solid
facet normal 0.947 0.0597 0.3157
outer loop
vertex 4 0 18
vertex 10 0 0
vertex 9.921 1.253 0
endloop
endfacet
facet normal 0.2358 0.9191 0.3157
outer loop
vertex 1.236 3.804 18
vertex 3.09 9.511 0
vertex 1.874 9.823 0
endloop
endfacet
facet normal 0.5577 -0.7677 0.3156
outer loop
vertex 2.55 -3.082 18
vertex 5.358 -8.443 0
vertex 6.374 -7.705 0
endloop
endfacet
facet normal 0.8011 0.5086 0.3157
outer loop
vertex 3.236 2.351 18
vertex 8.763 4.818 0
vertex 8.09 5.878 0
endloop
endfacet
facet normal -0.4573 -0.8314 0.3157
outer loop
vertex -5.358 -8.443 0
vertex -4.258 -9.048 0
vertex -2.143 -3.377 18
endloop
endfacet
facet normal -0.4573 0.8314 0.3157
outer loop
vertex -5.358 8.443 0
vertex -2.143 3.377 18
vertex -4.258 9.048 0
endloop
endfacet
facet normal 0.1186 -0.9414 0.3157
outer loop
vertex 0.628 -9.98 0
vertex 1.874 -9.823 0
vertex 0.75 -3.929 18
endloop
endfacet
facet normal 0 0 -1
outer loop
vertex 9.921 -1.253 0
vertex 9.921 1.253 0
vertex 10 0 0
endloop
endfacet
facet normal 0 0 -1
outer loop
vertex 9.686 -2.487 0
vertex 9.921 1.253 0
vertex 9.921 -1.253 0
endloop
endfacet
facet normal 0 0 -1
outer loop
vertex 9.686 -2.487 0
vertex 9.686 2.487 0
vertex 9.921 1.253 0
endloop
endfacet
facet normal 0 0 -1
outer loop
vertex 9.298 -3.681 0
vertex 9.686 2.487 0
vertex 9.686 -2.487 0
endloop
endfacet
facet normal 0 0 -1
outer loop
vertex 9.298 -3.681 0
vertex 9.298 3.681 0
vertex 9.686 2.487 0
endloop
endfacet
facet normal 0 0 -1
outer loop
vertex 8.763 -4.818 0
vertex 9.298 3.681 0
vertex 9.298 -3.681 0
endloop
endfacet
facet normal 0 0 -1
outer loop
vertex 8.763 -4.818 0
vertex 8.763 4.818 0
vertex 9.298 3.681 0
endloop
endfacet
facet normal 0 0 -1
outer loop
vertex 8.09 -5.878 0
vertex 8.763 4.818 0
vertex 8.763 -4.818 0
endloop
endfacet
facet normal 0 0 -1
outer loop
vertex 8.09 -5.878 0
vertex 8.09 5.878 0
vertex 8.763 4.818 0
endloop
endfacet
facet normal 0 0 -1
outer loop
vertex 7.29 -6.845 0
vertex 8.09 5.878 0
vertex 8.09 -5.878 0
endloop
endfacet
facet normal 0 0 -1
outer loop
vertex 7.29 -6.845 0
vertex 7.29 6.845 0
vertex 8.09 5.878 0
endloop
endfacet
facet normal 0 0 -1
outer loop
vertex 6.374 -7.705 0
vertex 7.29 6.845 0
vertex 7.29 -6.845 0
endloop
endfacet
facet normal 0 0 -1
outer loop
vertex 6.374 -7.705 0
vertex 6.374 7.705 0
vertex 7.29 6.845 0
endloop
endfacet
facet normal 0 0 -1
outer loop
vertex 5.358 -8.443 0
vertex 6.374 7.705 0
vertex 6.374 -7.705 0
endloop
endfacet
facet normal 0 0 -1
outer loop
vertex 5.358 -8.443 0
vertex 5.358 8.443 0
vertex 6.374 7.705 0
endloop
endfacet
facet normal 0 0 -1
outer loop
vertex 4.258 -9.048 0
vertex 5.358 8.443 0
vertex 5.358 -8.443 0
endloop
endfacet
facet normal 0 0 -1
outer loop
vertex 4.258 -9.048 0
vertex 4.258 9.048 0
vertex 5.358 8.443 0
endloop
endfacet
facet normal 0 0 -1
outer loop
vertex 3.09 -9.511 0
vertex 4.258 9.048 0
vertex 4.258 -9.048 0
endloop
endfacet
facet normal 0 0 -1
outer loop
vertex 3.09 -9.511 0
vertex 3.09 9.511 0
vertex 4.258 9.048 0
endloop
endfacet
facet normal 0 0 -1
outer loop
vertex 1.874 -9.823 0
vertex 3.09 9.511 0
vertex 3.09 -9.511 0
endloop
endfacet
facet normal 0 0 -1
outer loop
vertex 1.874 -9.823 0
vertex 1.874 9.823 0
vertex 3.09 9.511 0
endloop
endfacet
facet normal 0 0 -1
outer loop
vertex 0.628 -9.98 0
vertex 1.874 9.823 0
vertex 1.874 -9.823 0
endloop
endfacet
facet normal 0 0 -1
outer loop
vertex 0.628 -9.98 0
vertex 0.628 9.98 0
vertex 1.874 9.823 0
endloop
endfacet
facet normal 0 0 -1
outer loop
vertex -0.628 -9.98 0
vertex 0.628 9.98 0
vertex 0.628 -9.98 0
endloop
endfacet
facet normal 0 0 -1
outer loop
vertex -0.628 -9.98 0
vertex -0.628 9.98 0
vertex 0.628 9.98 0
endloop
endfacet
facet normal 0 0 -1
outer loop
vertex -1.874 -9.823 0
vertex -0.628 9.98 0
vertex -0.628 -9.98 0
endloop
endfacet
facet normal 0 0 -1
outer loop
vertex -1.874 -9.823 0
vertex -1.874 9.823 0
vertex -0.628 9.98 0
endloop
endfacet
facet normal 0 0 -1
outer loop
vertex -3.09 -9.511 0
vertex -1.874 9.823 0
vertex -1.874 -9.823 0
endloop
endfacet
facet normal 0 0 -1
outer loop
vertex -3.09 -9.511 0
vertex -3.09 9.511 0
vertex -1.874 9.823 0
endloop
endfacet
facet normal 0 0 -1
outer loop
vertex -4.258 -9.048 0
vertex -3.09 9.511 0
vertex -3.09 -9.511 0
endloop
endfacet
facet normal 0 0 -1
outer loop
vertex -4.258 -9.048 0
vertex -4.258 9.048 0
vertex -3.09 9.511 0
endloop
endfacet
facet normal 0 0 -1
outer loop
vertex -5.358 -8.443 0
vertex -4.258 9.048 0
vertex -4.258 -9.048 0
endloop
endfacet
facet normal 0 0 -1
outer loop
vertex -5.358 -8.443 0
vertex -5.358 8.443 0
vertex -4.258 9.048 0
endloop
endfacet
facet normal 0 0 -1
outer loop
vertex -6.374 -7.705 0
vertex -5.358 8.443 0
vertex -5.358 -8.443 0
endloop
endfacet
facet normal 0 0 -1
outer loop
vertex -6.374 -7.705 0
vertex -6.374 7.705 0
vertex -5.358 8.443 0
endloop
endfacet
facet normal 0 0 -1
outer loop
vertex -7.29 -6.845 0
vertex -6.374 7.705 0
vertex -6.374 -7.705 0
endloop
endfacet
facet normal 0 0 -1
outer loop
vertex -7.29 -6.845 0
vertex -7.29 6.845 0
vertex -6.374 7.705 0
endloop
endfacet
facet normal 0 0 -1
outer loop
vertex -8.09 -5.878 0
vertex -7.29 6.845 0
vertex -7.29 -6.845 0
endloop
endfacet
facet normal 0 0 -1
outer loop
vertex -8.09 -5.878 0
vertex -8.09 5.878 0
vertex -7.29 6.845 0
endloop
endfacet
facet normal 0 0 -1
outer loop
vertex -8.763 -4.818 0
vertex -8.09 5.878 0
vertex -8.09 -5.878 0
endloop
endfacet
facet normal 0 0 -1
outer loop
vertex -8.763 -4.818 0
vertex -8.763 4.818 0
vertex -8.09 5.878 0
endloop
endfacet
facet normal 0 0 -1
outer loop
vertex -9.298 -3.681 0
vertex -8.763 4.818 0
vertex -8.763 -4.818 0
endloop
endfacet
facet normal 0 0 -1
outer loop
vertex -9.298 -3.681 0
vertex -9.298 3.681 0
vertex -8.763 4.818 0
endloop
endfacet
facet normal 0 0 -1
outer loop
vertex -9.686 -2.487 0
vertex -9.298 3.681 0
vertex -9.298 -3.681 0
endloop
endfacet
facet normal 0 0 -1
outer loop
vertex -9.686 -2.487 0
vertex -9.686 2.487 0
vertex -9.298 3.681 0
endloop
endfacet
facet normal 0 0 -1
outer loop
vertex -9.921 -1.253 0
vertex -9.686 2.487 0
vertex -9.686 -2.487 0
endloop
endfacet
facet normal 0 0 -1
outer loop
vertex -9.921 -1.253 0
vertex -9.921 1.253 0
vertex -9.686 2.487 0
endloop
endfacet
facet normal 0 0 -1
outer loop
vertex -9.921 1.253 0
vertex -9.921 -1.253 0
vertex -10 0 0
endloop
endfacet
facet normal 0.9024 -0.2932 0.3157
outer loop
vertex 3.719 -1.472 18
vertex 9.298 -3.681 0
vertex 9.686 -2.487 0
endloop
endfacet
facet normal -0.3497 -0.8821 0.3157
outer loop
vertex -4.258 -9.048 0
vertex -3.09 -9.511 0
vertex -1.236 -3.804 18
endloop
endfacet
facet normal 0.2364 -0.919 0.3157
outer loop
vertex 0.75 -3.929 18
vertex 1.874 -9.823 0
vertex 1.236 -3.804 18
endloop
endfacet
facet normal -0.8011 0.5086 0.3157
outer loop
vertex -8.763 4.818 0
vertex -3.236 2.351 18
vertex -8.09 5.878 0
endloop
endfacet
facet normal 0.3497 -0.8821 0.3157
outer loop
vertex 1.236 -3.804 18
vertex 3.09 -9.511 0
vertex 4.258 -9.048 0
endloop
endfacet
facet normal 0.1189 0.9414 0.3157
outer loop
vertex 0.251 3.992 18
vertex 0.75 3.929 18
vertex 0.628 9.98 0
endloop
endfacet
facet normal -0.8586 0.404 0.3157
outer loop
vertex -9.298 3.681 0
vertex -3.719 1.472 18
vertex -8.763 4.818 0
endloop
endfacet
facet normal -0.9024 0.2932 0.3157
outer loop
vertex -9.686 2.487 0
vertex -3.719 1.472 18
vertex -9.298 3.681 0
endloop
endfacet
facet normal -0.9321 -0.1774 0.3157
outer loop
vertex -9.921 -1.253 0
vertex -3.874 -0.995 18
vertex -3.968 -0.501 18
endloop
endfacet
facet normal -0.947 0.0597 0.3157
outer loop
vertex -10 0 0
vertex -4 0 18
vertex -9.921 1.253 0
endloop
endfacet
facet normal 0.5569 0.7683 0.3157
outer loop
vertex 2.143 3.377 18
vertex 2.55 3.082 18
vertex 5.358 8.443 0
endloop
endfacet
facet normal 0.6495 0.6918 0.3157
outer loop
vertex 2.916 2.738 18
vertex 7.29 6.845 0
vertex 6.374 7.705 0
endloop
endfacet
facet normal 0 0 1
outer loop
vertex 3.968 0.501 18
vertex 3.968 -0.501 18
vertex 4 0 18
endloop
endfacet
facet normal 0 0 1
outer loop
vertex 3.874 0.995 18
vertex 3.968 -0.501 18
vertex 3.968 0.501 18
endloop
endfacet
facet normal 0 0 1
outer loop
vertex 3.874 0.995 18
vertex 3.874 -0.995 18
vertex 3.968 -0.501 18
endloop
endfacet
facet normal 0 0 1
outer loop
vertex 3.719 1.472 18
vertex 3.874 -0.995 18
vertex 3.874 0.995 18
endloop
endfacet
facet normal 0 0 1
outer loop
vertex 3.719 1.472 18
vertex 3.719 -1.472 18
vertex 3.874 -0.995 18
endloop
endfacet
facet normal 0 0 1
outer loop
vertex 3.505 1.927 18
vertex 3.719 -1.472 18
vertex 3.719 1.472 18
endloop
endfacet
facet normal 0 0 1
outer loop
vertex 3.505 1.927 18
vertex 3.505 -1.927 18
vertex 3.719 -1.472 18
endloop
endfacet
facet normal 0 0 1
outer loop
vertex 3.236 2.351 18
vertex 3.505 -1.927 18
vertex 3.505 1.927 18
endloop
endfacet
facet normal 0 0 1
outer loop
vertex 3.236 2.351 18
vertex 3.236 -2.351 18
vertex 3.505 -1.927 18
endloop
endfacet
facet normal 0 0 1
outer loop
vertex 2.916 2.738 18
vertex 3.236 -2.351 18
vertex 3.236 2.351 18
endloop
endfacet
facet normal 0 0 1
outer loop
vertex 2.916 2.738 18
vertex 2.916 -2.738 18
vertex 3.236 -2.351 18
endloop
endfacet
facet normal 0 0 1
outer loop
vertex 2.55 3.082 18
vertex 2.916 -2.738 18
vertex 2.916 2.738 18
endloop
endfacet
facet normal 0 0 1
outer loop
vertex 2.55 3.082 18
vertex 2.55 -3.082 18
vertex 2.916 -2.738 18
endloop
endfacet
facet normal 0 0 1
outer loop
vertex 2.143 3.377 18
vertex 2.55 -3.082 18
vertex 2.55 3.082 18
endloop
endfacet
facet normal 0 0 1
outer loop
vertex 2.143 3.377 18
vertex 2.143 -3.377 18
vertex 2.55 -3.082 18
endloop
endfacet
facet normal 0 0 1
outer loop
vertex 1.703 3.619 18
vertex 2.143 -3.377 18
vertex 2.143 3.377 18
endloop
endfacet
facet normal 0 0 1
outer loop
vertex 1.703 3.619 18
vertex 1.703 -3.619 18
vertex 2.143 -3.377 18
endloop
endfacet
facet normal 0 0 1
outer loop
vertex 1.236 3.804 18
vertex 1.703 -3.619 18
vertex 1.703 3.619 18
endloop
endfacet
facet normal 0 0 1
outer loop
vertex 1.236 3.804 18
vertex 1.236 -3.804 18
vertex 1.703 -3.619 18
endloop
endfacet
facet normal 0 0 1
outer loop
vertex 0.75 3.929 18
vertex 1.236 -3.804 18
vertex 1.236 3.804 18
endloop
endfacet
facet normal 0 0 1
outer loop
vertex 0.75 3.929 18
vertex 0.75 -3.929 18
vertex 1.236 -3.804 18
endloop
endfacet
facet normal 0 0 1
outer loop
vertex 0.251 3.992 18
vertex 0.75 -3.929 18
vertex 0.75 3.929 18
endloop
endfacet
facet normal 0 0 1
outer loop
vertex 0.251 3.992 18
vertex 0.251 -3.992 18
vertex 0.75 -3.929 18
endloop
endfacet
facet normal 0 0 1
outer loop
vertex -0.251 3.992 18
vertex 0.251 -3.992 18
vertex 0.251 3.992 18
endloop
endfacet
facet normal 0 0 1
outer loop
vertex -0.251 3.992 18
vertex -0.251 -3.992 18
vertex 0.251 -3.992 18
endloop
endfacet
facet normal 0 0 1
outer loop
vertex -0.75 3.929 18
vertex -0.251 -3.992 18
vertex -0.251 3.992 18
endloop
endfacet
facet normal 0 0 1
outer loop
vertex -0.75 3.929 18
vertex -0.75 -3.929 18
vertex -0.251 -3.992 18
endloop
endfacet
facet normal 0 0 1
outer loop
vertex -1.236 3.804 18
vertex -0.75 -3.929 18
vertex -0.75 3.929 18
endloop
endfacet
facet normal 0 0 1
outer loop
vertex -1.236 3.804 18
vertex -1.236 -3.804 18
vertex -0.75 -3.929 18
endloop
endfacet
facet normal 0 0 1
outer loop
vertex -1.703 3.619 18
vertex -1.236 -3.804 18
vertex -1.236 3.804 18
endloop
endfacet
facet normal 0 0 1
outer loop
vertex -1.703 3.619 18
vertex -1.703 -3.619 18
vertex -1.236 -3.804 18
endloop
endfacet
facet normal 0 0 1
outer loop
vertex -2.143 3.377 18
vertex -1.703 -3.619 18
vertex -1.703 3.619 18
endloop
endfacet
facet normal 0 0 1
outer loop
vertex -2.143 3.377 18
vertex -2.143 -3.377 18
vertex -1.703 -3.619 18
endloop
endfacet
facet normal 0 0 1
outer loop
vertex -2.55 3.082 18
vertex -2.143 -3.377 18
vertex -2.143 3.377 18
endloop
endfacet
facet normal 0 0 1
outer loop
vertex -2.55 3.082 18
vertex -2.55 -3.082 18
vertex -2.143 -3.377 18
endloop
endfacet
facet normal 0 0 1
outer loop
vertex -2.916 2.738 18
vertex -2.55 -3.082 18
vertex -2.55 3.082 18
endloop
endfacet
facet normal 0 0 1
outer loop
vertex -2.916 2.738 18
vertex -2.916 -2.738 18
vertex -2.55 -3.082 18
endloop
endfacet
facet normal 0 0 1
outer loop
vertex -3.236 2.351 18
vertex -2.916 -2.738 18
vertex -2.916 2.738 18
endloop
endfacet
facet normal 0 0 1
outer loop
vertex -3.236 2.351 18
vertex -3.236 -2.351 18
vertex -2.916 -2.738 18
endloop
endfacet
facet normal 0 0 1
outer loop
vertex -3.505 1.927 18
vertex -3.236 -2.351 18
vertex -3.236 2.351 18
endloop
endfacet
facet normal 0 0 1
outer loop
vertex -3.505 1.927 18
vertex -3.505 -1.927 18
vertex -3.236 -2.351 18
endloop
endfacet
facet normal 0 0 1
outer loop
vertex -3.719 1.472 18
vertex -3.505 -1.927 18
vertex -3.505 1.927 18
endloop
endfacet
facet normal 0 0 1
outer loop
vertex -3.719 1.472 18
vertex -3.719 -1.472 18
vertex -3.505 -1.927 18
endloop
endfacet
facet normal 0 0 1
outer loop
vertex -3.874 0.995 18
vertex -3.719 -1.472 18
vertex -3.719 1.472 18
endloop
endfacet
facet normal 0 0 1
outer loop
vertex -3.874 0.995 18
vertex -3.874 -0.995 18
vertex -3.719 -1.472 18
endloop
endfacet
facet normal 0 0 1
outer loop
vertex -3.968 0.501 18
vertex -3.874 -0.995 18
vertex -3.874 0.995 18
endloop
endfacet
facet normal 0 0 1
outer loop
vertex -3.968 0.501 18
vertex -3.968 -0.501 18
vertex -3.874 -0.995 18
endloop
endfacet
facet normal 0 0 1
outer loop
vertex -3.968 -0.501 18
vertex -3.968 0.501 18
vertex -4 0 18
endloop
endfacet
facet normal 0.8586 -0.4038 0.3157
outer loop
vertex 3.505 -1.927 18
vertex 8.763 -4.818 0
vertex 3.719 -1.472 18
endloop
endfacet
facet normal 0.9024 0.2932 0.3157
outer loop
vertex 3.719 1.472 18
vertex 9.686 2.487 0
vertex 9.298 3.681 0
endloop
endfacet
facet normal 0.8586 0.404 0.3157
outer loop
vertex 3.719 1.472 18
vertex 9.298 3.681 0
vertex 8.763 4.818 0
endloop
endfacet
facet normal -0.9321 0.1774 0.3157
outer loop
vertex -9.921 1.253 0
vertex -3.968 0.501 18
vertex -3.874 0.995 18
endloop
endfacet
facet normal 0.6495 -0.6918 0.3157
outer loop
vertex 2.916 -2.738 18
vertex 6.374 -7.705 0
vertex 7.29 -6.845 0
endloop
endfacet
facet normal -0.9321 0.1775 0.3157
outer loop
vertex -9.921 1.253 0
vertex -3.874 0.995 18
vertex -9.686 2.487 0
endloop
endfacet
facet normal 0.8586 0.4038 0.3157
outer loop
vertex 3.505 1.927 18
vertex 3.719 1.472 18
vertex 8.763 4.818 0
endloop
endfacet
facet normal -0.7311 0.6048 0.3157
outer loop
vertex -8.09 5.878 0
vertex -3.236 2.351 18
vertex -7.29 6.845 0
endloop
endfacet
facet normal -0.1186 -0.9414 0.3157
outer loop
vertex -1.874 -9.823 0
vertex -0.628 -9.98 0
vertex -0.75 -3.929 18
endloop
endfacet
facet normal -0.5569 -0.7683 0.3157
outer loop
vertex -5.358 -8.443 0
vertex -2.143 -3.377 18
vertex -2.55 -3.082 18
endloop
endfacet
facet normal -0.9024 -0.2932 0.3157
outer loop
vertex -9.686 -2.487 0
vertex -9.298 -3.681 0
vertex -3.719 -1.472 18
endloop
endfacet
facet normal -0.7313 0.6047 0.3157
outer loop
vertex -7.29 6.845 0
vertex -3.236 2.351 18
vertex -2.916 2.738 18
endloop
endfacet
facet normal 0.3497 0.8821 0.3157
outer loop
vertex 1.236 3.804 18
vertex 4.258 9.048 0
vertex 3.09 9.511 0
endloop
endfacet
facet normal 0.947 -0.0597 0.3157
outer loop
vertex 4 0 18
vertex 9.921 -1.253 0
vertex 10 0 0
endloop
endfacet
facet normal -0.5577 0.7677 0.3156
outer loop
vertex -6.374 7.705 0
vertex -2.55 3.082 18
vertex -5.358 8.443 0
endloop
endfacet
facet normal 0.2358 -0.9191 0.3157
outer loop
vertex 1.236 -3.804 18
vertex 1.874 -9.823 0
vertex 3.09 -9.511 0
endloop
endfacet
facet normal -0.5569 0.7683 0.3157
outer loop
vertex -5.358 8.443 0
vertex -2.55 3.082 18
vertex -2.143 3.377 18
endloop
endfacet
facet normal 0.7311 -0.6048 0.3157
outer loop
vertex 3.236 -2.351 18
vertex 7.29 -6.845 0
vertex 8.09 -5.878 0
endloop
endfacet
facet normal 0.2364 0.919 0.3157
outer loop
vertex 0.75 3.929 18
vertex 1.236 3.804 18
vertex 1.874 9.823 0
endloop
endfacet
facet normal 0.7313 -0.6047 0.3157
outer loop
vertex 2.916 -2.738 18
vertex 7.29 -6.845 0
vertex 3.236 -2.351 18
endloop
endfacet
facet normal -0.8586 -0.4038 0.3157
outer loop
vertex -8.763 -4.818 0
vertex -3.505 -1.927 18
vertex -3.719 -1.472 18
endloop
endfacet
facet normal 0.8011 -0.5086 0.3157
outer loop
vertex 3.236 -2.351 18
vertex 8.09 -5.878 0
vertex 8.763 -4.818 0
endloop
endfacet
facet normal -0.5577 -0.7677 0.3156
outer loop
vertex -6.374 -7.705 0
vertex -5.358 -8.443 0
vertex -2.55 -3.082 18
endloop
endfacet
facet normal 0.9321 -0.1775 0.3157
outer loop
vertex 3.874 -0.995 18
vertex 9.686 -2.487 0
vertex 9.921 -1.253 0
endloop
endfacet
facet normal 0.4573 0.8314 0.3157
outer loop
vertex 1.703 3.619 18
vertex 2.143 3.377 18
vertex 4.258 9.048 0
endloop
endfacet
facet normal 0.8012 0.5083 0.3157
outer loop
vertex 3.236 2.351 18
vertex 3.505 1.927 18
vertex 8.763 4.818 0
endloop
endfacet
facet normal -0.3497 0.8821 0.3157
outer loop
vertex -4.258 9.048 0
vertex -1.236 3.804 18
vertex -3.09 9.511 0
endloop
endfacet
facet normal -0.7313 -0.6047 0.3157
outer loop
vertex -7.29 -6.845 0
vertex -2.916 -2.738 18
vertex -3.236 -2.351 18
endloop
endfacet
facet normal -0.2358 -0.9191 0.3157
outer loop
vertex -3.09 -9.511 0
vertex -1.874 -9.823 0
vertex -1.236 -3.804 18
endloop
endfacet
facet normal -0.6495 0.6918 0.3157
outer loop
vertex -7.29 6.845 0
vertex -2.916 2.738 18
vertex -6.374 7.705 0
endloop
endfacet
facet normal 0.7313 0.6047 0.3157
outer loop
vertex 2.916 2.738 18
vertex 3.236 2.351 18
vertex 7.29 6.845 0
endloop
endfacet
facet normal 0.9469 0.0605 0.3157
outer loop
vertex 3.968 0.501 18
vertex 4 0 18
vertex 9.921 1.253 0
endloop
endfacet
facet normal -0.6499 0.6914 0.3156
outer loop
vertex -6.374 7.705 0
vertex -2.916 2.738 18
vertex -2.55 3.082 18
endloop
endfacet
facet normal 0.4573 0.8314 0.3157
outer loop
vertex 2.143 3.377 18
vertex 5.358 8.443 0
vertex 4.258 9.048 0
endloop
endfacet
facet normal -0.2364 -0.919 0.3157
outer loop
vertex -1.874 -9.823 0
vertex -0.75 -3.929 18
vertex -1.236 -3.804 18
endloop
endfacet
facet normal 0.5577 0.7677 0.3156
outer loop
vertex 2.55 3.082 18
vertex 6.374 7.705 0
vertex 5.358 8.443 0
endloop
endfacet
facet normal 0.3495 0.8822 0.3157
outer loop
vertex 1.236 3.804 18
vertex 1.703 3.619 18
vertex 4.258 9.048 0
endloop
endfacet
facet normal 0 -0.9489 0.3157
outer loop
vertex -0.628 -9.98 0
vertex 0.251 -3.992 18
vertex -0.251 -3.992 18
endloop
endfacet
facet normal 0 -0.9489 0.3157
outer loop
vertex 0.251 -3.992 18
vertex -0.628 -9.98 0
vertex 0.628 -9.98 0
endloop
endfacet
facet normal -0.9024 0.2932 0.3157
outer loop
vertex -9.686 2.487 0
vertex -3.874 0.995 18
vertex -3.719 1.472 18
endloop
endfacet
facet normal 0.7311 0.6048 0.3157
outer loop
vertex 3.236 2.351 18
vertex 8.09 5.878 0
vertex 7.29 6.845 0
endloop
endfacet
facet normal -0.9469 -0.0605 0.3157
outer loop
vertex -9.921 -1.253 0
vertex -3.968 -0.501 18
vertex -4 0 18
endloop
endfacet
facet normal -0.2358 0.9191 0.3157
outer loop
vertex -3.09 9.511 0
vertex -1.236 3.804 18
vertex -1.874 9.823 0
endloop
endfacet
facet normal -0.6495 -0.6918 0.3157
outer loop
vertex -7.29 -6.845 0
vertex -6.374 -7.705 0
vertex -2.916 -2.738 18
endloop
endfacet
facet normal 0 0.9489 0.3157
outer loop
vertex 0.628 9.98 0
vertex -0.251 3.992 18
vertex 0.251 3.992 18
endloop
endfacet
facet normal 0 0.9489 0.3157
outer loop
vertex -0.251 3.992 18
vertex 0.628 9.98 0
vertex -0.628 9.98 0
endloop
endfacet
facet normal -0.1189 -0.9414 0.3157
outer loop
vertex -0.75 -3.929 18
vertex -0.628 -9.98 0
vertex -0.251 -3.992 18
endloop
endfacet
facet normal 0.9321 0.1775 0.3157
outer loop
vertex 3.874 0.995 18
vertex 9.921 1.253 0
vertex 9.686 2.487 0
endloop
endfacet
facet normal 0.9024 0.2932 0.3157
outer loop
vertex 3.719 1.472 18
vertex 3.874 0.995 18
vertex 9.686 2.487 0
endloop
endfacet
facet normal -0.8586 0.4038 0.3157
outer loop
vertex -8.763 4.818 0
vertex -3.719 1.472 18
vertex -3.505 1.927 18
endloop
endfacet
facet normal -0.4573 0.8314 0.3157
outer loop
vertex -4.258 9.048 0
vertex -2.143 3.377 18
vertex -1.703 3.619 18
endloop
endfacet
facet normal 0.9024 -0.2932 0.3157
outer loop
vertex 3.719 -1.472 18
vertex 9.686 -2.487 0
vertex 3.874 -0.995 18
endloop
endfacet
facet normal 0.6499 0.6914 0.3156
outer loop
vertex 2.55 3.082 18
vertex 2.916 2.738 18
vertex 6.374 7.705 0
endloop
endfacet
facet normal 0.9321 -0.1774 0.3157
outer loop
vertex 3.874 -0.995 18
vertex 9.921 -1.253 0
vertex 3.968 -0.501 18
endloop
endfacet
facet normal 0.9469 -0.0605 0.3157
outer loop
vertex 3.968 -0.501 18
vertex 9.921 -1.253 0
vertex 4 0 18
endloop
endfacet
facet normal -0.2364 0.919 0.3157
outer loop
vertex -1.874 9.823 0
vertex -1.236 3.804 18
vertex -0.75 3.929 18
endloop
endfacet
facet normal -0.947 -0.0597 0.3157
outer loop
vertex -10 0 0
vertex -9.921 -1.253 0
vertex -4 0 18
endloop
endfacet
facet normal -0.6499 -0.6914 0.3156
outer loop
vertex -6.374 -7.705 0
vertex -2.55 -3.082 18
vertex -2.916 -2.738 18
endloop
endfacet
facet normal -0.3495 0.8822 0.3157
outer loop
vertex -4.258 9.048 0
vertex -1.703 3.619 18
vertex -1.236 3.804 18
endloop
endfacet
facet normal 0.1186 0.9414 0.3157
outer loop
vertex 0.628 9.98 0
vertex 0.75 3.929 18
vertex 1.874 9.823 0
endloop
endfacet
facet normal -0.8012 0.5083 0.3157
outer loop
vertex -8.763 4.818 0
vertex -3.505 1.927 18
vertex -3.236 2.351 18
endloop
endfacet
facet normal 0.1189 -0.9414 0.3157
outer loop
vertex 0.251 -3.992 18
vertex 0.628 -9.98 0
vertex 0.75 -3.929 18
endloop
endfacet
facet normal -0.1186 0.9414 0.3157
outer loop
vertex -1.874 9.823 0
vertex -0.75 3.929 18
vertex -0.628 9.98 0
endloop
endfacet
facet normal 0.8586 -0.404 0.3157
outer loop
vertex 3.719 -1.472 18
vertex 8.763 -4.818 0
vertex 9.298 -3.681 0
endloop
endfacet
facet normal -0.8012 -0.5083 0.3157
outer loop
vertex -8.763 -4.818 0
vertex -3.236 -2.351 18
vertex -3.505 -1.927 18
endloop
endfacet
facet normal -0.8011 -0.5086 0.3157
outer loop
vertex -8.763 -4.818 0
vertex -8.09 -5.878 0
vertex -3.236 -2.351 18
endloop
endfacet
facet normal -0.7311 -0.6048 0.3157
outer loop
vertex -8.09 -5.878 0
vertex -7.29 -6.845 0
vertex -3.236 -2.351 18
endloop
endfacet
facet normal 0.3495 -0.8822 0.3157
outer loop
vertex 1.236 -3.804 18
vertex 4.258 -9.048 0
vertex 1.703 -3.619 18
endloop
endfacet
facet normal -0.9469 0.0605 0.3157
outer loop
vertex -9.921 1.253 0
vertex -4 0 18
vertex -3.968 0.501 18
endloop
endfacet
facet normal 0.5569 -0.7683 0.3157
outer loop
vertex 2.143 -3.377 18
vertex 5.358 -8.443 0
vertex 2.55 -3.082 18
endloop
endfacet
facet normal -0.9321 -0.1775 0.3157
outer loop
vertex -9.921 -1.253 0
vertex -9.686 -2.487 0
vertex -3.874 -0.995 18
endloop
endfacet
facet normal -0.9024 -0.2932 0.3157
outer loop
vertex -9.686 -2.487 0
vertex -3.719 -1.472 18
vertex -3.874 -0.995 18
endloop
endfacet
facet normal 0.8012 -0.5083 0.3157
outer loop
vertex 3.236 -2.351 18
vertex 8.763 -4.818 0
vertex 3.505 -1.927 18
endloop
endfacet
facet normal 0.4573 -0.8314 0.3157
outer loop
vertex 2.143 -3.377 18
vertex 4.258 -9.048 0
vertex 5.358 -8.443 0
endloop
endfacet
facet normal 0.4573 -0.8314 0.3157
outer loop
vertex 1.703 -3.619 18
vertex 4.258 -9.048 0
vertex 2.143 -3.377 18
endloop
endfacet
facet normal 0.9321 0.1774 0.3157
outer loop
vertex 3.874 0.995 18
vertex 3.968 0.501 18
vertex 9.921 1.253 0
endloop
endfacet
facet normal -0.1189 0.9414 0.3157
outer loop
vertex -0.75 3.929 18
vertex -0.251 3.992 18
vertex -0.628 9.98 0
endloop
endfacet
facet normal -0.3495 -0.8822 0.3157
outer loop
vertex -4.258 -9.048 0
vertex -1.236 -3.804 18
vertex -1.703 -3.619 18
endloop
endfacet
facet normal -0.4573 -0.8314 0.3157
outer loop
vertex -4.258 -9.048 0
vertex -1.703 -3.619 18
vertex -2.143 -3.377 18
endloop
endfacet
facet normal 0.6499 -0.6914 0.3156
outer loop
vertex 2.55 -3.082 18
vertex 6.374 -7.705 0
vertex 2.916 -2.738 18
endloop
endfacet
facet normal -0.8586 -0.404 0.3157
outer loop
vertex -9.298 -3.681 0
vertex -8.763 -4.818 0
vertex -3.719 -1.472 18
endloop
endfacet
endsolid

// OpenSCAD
$fn = 50;

difference() {
	union() {
		cylinder(h = 18, r1 = 10, r2 = 4);
	}
	union();
}
